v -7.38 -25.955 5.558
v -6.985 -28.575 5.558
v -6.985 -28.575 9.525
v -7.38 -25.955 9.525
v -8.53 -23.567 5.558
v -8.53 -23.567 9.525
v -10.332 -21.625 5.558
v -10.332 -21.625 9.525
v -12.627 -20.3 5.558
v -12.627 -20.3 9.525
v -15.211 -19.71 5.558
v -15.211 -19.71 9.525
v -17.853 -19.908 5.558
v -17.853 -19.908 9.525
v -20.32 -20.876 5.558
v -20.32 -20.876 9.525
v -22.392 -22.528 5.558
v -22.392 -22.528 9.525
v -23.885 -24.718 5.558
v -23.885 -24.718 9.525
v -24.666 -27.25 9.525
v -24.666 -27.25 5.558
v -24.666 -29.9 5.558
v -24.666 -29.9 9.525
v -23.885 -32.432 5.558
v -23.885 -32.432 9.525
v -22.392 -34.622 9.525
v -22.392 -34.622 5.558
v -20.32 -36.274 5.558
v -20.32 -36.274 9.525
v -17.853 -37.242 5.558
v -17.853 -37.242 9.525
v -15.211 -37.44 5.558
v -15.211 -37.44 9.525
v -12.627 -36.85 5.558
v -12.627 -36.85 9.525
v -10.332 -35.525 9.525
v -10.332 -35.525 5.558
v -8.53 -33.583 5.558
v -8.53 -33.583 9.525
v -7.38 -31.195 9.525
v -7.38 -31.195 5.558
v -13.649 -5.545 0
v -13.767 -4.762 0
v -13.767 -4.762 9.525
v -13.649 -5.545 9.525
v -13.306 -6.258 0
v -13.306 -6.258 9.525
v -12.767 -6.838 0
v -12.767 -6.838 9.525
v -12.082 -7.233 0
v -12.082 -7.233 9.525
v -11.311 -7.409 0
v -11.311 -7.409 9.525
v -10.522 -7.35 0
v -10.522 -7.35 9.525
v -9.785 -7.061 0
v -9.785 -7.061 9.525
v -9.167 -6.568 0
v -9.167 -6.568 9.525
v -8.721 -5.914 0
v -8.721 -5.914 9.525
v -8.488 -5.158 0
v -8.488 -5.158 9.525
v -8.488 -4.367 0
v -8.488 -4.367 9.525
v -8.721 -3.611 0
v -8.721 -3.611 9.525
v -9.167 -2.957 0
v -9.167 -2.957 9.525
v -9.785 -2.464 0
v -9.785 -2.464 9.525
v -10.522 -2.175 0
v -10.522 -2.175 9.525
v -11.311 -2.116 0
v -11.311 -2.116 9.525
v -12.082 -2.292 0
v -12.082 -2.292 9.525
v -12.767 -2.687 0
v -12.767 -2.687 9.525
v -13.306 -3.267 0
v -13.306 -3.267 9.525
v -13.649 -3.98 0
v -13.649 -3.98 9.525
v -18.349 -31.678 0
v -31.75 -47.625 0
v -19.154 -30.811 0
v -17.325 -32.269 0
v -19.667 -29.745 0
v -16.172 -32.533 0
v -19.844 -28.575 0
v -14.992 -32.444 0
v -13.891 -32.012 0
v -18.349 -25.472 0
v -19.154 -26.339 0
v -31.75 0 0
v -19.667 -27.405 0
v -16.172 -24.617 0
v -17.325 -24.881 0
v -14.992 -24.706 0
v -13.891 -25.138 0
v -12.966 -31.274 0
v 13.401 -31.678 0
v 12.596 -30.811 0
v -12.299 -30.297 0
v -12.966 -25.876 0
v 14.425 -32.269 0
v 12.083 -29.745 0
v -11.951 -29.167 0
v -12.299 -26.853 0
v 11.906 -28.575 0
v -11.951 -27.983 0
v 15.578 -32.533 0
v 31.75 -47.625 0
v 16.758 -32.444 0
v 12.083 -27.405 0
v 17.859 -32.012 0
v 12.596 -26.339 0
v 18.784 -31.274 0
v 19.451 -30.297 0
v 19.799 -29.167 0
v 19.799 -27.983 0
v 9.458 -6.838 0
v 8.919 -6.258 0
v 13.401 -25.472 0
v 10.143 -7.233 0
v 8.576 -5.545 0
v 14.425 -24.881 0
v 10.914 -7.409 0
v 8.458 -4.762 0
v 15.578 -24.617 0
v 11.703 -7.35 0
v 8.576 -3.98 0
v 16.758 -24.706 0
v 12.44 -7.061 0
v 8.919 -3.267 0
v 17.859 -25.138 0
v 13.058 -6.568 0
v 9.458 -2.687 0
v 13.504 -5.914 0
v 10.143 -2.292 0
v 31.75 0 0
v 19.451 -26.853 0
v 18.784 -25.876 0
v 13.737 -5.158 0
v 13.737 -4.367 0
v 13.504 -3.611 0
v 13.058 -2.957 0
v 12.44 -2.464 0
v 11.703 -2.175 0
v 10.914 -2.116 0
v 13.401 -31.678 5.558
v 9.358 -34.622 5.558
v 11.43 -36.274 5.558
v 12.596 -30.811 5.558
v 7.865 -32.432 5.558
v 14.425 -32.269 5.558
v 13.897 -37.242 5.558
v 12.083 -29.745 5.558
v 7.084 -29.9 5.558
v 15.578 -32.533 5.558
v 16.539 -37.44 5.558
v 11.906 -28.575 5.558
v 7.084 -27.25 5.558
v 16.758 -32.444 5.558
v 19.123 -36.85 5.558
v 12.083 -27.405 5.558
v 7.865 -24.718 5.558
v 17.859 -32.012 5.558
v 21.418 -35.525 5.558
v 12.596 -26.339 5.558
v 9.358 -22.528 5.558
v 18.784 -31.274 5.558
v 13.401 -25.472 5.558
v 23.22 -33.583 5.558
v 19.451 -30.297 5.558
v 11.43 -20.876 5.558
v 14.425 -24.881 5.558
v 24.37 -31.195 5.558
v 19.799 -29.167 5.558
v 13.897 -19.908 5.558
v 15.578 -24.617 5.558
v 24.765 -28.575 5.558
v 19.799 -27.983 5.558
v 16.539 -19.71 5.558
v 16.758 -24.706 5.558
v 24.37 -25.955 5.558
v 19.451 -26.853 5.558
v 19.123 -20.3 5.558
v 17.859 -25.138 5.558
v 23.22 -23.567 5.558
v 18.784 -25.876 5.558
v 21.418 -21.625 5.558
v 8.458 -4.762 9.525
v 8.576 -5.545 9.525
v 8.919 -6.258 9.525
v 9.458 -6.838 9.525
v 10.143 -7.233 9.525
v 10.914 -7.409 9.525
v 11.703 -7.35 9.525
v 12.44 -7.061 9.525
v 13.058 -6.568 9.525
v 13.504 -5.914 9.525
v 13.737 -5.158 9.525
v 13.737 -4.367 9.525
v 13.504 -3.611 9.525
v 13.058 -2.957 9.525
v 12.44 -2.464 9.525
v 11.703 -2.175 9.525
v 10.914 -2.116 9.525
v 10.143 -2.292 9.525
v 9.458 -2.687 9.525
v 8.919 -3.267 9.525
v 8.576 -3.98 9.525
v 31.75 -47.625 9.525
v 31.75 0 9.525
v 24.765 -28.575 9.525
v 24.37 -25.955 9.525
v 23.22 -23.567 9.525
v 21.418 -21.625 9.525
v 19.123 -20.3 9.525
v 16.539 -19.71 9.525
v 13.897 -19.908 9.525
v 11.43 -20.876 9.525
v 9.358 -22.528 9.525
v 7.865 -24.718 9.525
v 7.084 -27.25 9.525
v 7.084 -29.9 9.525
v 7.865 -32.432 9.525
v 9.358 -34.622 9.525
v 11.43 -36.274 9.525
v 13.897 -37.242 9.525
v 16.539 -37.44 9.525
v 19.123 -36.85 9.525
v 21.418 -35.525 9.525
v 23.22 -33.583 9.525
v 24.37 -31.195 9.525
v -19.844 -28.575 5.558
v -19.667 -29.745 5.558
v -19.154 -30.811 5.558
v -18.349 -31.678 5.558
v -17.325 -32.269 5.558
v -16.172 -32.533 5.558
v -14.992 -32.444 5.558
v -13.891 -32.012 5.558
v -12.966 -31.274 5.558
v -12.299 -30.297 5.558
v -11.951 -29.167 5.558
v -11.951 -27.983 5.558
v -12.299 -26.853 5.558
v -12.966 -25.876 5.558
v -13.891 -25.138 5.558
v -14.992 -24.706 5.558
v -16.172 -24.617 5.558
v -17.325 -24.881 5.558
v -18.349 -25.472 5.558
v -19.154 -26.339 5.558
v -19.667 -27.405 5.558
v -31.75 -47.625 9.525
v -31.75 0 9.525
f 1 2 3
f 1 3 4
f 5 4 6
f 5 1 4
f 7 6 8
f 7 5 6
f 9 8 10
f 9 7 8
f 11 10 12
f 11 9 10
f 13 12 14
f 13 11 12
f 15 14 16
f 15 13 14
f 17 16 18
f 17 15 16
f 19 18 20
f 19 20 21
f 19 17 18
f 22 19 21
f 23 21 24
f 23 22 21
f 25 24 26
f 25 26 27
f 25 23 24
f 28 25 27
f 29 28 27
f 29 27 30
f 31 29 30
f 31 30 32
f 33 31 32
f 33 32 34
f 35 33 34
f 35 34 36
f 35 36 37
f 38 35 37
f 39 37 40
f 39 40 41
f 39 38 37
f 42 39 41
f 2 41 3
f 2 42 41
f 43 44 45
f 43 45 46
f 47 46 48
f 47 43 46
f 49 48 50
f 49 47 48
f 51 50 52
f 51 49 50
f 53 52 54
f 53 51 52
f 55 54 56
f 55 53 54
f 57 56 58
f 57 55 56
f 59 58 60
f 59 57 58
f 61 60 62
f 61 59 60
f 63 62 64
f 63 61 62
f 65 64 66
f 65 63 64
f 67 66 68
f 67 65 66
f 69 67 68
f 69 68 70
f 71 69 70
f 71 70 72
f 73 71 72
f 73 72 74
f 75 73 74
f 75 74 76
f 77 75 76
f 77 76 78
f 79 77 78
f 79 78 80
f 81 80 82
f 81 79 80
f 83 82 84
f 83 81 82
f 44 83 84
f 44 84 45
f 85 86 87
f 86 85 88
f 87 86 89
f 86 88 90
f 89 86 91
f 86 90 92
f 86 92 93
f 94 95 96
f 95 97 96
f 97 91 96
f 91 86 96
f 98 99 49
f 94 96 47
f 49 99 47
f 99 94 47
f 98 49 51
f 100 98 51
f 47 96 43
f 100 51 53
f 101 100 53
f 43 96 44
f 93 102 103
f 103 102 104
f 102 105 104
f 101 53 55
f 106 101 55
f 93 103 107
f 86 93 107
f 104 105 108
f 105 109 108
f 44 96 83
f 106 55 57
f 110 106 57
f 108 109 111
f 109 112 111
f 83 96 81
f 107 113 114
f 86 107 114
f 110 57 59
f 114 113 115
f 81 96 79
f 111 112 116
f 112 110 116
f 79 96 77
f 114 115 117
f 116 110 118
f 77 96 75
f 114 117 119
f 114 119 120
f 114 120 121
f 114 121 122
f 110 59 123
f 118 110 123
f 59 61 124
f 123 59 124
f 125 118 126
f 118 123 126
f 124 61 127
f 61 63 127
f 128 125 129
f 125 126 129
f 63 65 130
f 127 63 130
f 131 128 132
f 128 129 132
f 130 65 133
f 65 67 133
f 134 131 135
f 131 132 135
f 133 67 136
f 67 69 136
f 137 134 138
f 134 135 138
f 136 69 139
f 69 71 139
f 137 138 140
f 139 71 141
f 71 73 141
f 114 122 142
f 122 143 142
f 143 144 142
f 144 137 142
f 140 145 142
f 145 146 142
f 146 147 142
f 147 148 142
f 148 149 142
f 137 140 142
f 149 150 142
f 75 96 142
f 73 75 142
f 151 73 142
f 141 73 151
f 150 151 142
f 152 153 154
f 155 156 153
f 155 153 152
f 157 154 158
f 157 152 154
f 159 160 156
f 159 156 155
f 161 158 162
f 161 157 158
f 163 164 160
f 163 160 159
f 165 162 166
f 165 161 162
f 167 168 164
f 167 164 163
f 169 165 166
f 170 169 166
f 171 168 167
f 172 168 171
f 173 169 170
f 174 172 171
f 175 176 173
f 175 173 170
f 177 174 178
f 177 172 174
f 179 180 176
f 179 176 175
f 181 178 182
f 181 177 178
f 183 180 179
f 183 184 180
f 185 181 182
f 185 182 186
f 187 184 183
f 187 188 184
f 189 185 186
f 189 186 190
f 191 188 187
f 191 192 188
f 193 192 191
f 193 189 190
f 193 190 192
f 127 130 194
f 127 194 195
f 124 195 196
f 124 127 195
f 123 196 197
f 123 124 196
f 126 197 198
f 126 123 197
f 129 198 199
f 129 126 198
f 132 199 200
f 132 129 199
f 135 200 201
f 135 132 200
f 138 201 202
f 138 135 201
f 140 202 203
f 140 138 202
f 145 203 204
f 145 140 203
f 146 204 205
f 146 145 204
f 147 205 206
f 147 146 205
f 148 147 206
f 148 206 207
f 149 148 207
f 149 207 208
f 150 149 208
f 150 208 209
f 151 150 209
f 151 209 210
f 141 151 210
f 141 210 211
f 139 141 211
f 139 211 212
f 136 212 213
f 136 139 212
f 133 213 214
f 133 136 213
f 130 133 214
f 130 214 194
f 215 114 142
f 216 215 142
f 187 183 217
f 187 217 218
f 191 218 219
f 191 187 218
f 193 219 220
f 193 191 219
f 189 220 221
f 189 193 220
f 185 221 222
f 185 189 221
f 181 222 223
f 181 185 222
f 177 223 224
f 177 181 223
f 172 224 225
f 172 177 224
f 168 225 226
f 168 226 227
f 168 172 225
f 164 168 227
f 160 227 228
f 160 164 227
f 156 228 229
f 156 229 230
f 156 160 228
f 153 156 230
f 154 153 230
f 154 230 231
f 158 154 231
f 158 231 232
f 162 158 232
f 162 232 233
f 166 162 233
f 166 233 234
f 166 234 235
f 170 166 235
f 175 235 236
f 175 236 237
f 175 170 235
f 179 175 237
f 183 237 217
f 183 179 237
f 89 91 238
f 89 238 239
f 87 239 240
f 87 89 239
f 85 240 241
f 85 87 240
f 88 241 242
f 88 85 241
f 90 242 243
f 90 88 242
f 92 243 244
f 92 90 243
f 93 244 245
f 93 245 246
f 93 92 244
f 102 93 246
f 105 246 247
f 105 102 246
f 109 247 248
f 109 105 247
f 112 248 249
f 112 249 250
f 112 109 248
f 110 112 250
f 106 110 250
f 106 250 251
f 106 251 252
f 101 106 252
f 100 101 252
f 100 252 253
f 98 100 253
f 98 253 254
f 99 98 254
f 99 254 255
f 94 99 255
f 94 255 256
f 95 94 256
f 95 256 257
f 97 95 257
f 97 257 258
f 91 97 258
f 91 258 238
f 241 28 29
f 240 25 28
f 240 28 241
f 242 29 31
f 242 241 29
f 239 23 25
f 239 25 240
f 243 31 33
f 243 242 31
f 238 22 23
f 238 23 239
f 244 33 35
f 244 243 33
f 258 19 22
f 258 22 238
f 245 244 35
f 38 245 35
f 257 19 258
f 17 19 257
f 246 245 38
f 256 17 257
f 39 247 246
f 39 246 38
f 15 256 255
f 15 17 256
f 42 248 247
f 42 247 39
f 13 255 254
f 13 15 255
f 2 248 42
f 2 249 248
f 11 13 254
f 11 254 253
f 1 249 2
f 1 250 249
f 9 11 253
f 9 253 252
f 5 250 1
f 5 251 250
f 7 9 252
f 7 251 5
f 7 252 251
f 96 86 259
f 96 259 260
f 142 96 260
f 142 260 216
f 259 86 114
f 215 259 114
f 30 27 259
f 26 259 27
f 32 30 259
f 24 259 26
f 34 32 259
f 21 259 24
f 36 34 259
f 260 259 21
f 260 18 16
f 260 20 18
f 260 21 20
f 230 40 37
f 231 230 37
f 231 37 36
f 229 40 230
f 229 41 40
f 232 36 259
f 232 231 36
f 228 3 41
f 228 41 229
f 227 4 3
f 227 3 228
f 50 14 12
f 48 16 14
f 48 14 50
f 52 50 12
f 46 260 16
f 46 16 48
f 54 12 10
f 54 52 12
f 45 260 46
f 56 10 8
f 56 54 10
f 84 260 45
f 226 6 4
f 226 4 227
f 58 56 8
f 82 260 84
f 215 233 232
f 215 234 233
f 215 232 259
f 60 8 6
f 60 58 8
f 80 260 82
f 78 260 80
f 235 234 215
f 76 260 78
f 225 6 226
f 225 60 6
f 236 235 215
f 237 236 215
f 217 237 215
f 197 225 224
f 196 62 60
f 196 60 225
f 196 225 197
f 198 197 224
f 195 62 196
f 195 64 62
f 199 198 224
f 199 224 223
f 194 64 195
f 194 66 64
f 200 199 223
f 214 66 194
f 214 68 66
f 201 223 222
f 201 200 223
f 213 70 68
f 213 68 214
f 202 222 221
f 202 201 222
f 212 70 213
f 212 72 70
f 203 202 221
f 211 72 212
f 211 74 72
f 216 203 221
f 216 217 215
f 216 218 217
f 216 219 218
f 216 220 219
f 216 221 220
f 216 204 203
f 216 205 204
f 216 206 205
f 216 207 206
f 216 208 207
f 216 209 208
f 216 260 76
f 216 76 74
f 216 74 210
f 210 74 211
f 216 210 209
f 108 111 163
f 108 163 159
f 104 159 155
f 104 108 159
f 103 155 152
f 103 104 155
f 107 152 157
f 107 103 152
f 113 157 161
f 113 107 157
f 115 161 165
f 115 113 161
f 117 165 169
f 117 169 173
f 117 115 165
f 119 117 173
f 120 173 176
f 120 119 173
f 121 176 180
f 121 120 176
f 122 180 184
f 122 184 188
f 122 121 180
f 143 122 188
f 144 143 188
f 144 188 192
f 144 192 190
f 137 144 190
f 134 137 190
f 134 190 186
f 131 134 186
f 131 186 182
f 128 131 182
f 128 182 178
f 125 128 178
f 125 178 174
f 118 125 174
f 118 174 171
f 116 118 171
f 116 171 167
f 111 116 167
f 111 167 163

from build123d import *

# Parameters (mm, degrees)
SKETCH1_W           = 63.5
SKETCH1_H           = 47.625
SKETCH1_R           = 8.89
SKETCH1_R_2         = 2.6543
SKETCH1_R_3         = 3.96875
BOSS_EXTRUDE1_DEPTH = 9.525
CUT_EXTRUDE2_START  = 5.55752
SKETCH1_3_R         = 8.89
SKETCH1_3_R_2       = 3.96875
CUT_EXTRUDE2_DEPTH  = 3.96748


with BuildPart() as part:
    # Sketch1 → Boss-Extrude1 (new body)
    # profile 1 of 3: a face of its own
    with BuildSketch(Plane.XY):
        with Locations((0, -23.8125)):
            Rectangle(SKETCH1_W, SKETCH1_H)
        with Locations((-15.875, -28.575)):
            Circle(SKETCH1_R, mode=Mode.SUBTRACT)
        with Locations(Location((11.1125, -4.7625, 0), (0, 0, 180))):
            Circle(SKETCH1_R_2, mode=Mode.SUBTRACT)
        with Locations(Location((-11.1125, -4.7625, 0), (0, 0, 180))):
            Circle(SKETCH1_R_2, mode=Mode.SUBTRACT)
        with Locations((15.875, -28.575)):
            Circle(SKETCH1_R, mode=Mode.SUBTRACT)
    # profile 2 of 3: a face of its own
    with BuildSketch(Plane.XY):
        with Locations((-15.875, -28.575)):
            Circle(SKETCH1_R)
        with Locations(Location((-15.875, -28.575, 0), (0, 0, 180))):
            Circle(SKETCH1_R_3, mode=Mode.SUBTRACT)
    # profile 3 of 3: a face of its own
    with BuildSketch(Plane.XY):
        with Locations((15.875, -28.575)):
            Circle(SKETCH1_R)
        with Locations(Location((15.875, -28.575, 0), (0, 0, 180))):
            Circle(SKETCH1_R_3, mode=Mode.SUBTRACT)
    extrude(amount=BOSS_EXTRUDE1_DEPTH)

    # Sketch1<3> → Cut-Extrude2 (cut)
    # profile 1 of 2: a face of its own
    with BuildSketch(Plane.XY.offset(CUT_EXTRUDE2_START)):
        with Locations((-15.875, -28.575)):
            Circle(SKETCH1_3_R)
        with Locations(Location((-15.875, -28.575, 0), (0, 0, 180))):
            Circle(SKETCH1_3_R_2, mode=Mode.SUBTRACT)
    # profile 2 of 2: a face of its own
    with BuildSketch(Plane.XY.offset(CUT_EXTRUDE2_START)):
        with Locations((15.875, -28.575)):
            Circle(SKETCH1_3_R)
        with Locations(Location((15.875, -28.575, 0), (0, 0, 180))):
            Circle(SKETCH1_3_R_2, mode=Mode.SUBTRACT)
    extrude(amount=CUT_EXTRUDE2_DEPTH, mode=Mode.SUBTRACT)


solid = part.part
